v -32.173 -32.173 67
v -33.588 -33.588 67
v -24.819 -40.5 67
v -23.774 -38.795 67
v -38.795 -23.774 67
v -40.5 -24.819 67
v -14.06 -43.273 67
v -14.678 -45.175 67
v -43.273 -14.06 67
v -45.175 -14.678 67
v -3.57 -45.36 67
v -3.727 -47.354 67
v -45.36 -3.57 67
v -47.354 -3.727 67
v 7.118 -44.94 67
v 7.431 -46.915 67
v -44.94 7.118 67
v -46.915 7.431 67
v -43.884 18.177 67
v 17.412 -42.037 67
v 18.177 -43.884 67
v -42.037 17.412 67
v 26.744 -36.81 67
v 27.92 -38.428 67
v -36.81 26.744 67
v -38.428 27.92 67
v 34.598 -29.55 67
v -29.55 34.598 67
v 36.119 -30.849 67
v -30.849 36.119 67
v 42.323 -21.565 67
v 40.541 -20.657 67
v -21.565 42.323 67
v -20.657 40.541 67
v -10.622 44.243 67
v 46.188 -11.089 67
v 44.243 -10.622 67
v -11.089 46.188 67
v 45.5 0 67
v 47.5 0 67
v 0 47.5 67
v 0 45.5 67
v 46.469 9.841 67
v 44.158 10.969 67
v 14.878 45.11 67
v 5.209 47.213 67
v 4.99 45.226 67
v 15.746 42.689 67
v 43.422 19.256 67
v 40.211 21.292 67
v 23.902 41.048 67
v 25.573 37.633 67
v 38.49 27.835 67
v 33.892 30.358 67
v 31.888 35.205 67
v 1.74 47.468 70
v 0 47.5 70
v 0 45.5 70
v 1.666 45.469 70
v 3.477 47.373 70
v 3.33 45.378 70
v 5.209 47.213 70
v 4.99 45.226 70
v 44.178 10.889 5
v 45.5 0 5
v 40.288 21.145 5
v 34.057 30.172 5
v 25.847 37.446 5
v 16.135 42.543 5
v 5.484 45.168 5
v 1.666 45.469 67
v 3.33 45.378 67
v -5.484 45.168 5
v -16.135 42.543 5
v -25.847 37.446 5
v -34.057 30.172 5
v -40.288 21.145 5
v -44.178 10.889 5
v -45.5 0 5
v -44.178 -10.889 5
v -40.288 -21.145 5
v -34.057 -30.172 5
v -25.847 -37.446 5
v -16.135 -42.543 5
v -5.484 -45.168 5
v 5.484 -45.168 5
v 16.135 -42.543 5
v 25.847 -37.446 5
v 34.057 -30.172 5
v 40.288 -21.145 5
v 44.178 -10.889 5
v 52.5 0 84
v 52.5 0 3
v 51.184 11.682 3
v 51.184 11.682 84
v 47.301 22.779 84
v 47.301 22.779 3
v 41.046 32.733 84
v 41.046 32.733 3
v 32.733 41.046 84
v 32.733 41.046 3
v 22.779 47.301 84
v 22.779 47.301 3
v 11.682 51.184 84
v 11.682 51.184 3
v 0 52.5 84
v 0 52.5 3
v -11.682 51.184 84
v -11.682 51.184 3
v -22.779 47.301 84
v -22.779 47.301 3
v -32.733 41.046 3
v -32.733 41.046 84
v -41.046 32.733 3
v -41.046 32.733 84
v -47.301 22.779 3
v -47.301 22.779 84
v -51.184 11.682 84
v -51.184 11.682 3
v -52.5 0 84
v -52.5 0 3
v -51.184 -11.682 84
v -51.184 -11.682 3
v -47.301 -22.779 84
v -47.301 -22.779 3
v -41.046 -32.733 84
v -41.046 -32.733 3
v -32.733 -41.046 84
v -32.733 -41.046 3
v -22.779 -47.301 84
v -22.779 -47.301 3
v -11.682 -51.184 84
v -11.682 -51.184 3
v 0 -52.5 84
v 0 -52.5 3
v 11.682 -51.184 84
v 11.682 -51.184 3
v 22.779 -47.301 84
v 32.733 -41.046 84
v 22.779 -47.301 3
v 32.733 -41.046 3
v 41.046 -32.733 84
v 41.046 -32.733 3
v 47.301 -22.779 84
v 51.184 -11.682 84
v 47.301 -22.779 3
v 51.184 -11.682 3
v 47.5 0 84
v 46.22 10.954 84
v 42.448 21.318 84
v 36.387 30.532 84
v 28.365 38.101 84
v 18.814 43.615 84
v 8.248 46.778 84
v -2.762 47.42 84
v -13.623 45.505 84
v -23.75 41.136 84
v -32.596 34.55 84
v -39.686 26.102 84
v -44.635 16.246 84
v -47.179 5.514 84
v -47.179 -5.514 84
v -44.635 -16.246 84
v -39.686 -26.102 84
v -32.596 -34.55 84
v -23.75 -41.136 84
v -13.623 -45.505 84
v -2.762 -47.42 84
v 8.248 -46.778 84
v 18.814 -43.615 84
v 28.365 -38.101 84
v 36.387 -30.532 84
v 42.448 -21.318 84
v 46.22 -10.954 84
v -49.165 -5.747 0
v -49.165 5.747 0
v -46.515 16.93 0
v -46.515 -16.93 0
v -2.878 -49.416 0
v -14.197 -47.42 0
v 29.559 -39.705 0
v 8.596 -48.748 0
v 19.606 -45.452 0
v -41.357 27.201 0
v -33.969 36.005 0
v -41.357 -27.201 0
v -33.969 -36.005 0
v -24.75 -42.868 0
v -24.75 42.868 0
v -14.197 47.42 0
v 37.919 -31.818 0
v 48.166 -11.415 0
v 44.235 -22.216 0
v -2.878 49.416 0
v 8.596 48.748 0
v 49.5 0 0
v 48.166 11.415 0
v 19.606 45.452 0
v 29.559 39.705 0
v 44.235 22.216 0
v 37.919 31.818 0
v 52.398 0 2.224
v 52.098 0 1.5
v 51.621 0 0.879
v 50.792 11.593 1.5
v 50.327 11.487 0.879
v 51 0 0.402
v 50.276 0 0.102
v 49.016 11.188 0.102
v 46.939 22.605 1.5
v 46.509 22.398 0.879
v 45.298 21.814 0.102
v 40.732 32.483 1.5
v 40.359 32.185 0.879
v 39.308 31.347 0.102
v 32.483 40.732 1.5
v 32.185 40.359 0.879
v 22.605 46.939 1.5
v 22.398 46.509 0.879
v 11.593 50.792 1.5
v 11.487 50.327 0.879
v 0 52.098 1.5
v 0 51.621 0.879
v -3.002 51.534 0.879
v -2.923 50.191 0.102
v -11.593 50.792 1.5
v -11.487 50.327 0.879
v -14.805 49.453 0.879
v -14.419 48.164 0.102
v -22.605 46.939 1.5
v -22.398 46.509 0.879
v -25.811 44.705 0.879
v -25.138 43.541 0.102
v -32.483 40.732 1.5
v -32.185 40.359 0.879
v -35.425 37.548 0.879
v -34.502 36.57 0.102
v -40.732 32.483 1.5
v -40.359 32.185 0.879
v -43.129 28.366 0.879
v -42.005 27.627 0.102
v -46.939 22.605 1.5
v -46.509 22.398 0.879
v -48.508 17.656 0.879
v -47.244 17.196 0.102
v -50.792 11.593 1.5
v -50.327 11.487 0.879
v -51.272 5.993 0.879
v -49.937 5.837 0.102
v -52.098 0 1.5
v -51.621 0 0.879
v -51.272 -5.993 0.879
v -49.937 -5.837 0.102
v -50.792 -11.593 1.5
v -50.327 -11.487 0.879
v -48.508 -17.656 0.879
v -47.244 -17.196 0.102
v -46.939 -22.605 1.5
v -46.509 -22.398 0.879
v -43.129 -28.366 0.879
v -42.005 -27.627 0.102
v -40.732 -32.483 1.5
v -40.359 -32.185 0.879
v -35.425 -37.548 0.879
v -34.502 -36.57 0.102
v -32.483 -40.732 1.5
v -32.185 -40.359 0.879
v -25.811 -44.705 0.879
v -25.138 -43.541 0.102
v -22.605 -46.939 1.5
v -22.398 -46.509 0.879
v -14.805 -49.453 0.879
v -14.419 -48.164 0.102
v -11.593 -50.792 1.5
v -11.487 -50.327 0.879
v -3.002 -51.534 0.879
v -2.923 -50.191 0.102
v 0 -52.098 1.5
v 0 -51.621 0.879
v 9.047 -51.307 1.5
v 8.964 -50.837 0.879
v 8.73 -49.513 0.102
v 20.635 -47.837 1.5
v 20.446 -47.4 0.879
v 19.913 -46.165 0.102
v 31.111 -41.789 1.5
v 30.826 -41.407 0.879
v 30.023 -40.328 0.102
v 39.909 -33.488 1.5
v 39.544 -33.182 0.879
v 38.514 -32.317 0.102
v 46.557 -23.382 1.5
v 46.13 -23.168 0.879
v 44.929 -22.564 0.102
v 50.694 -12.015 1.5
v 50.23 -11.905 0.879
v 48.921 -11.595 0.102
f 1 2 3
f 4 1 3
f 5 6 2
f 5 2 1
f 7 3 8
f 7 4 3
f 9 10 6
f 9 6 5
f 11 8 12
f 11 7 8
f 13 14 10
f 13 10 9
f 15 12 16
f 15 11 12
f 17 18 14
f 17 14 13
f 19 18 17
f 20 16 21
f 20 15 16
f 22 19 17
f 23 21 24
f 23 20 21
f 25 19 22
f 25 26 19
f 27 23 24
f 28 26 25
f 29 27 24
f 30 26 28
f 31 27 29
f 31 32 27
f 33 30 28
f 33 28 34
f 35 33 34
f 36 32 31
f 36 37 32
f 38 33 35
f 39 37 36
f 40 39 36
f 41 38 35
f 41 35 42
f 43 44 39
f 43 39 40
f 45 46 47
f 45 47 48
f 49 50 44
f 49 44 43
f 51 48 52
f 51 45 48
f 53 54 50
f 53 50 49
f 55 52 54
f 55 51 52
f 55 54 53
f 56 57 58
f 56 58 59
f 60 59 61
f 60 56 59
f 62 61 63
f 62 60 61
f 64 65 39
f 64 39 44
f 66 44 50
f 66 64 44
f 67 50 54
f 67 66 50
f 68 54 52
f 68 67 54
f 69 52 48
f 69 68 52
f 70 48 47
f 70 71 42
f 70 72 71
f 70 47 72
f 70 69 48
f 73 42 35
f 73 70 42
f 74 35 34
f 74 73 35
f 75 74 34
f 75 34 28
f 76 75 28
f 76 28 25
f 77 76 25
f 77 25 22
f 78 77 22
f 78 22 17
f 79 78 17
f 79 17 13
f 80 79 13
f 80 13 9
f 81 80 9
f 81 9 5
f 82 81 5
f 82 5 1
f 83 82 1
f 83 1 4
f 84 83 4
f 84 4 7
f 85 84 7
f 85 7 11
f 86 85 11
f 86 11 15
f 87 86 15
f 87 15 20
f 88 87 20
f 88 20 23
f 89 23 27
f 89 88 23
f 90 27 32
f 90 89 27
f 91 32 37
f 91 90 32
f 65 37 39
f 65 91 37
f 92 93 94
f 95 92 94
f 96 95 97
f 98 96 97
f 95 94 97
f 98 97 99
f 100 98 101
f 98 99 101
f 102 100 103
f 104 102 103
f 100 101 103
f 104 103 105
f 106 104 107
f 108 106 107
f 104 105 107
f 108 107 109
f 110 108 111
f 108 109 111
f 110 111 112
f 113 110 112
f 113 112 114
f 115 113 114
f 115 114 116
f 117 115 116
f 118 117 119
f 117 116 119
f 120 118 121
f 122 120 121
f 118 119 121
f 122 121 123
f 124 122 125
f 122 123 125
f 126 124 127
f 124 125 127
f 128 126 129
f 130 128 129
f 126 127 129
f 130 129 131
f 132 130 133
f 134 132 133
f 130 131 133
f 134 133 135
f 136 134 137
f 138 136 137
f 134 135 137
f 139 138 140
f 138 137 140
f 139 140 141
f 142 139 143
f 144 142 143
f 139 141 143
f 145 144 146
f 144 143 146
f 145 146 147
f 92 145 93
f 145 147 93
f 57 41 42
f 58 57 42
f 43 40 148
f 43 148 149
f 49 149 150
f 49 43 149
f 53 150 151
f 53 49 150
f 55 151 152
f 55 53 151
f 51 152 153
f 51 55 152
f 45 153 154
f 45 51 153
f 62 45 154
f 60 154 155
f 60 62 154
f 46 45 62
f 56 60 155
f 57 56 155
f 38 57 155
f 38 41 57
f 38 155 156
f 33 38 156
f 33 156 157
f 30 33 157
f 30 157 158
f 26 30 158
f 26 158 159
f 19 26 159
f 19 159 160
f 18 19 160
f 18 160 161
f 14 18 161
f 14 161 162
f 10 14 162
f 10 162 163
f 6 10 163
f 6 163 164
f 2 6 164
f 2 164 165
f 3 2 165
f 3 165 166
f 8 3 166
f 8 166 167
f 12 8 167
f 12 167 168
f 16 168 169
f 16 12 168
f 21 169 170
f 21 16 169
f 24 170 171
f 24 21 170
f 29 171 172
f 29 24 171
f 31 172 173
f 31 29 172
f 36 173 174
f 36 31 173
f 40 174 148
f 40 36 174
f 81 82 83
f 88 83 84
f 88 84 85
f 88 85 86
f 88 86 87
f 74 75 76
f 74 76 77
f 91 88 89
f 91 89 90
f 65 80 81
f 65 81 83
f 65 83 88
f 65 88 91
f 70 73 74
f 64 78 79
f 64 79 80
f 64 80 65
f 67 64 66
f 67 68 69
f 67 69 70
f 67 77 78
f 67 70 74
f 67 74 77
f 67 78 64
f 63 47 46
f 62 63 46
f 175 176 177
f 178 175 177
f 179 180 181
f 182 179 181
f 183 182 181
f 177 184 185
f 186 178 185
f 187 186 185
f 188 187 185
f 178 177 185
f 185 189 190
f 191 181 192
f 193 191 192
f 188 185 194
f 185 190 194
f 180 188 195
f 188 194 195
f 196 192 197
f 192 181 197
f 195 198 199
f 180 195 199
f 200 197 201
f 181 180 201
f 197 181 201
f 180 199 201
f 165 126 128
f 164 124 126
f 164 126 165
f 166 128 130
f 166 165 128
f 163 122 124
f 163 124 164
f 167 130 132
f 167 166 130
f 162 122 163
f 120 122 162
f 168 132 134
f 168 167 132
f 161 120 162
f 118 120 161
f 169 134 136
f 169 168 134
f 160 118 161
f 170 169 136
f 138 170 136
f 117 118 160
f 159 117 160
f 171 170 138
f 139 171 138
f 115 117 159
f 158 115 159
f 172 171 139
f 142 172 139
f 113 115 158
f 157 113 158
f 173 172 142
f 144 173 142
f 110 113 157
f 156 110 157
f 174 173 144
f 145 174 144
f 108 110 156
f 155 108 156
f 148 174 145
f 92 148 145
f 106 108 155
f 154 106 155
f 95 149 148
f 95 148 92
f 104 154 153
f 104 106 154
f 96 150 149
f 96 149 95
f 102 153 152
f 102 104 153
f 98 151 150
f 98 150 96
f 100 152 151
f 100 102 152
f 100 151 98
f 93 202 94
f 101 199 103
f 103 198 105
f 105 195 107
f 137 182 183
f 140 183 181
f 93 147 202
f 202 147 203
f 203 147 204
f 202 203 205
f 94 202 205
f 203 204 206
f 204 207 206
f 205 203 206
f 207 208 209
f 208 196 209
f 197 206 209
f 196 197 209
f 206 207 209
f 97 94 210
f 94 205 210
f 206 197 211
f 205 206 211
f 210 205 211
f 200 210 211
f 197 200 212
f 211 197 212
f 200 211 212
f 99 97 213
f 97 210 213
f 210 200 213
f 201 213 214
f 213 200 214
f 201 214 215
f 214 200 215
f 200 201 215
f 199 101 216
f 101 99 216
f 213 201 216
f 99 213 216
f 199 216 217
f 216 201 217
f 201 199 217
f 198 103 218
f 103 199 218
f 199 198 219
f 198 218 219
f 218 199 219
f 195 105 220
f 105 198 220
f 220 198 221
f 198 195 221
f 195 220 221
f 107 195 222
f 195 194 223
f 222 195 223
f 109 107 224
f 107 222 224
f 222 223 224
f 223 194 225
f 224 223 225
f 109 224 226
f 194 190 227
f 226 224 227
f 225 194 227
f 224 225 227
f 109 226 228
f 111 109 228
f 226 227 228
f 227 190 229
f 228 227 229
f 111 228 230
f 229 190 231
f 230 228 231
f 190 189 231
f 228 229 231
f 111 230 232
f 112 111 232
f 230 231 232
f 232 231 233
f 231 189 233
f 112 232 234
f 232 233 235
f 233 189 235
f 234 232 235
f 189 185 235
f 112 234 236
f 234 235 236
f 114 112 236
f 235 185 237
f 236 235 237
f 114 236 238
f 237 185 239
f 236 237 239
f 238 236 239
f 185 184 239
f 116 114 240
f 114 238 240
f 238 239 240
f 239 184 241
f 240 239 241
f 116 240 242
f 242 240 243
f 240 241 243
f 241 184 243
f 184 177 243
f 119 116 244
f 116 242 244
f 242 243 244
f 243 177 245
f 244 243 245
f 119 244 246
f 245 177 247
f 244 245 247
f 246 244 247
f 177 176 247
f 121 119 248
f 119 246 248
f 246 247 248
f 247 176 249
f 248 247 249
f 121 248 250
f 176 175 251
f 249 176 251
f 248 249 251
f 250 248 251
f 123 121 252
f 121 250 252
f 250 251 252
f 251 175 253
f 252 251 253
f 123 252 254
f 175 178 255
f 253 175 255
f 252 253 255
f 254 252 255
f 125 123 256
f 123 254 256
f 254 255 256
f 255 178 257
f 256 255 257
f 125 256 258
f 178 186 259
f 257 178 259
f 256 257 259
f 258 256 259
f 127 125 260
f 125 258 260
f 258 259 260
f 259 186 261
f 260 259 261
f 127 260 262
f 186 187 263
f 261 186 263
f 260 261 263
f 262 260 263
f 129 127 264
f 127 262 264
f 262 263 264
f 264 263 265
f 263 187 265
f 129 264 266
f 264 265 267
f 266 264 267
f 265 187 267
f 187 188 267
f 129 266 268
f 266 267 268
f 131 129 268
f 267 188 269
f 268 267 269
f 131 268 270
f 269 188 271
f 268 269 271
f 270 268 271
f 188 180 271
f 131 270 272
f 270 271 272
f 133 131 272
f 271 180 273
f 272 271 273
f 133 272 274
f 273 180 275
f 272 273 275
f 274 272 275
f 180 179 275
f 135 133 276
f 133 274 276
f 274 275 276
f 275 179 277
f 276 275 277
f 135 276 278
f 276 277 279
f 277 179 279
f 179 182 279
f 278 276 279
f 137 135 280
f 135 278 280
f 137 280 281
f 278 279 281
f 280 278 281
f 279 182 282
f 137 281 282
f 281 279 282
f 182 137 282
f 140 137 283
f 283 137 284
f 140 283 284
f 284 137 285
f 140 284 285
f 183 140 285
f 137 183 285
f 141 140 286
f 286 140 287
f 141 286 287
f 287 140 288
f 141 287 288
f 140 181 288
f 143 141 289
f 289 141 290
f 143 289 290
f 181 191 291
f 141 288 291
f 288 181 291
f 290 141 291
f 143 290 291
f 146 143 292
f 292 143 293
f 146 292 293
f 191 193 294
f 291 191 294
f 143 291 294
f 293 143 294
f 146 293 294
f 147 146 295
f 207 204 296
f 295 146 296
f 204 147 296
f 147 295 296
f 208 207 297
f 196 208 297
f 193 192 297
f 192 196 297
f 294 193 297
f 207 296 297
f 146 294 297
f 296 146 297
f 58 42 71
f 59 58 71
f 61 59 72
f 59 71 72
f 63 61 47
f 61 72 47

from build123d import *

# Parameters (mm, degrees)
F0_R     = 52.5
F1_DEPTH = 84
F2_T     = -5
F3_R     = 47.5
F3_R_2   = 45.5
F4_DEPTH = 62
F5_R     = 3
F7_DEPTH = 3


with BuildPart() as f1:
    # F0 (on Top) → F1 (new body)
    with BuildSketch(Plane.XY):
        Circle(F0_R)
    extrude(amount=F1_DEPTH)

    # F2
    f2_openings = [f1.faces().sort_by_distance(p)[0] for p in [
        (0, 0, 84),
    ]]
    offset(amount=F2_T, openings=f2_openings)

    # F3 (on face) → F4 (join)
    with BuildSketch(Plane.XY.offset(5)):
        Circle(F3_R)
        Circle(F3_R_2, mode=Mode.SUBTRACT)
    extrude(amount=F4_DEPTH)

    # F5
    f5_edges = [f1.edges().sort_by_distance(p)[0] for p in [
        (-52.5, 0, 0),
    ]]
    fillet(f5_edges, radius=F5_R)

    # F6 (on face) → F7 (join)
    with BuildSketch(Plane.XY.offset(67)):
        with BuildLine():
            ThreePointArc((5.2092810259, 47.2134873865), (2.6085771162, 47.4283177588), (0, 47.5))
            Line((0, 47.5), (0, 45.5))
            ThreePointArc((0, 45.5), (2.4987422903, 45.4313359584), (4.9899428775, 45.2255510755))
            Line((4.9899428775, 45.2255510755), (5.2092810259, 47.2134873865))
        make_face()
    extrude(amount=F7_DEPTH)


solid = f1.part
